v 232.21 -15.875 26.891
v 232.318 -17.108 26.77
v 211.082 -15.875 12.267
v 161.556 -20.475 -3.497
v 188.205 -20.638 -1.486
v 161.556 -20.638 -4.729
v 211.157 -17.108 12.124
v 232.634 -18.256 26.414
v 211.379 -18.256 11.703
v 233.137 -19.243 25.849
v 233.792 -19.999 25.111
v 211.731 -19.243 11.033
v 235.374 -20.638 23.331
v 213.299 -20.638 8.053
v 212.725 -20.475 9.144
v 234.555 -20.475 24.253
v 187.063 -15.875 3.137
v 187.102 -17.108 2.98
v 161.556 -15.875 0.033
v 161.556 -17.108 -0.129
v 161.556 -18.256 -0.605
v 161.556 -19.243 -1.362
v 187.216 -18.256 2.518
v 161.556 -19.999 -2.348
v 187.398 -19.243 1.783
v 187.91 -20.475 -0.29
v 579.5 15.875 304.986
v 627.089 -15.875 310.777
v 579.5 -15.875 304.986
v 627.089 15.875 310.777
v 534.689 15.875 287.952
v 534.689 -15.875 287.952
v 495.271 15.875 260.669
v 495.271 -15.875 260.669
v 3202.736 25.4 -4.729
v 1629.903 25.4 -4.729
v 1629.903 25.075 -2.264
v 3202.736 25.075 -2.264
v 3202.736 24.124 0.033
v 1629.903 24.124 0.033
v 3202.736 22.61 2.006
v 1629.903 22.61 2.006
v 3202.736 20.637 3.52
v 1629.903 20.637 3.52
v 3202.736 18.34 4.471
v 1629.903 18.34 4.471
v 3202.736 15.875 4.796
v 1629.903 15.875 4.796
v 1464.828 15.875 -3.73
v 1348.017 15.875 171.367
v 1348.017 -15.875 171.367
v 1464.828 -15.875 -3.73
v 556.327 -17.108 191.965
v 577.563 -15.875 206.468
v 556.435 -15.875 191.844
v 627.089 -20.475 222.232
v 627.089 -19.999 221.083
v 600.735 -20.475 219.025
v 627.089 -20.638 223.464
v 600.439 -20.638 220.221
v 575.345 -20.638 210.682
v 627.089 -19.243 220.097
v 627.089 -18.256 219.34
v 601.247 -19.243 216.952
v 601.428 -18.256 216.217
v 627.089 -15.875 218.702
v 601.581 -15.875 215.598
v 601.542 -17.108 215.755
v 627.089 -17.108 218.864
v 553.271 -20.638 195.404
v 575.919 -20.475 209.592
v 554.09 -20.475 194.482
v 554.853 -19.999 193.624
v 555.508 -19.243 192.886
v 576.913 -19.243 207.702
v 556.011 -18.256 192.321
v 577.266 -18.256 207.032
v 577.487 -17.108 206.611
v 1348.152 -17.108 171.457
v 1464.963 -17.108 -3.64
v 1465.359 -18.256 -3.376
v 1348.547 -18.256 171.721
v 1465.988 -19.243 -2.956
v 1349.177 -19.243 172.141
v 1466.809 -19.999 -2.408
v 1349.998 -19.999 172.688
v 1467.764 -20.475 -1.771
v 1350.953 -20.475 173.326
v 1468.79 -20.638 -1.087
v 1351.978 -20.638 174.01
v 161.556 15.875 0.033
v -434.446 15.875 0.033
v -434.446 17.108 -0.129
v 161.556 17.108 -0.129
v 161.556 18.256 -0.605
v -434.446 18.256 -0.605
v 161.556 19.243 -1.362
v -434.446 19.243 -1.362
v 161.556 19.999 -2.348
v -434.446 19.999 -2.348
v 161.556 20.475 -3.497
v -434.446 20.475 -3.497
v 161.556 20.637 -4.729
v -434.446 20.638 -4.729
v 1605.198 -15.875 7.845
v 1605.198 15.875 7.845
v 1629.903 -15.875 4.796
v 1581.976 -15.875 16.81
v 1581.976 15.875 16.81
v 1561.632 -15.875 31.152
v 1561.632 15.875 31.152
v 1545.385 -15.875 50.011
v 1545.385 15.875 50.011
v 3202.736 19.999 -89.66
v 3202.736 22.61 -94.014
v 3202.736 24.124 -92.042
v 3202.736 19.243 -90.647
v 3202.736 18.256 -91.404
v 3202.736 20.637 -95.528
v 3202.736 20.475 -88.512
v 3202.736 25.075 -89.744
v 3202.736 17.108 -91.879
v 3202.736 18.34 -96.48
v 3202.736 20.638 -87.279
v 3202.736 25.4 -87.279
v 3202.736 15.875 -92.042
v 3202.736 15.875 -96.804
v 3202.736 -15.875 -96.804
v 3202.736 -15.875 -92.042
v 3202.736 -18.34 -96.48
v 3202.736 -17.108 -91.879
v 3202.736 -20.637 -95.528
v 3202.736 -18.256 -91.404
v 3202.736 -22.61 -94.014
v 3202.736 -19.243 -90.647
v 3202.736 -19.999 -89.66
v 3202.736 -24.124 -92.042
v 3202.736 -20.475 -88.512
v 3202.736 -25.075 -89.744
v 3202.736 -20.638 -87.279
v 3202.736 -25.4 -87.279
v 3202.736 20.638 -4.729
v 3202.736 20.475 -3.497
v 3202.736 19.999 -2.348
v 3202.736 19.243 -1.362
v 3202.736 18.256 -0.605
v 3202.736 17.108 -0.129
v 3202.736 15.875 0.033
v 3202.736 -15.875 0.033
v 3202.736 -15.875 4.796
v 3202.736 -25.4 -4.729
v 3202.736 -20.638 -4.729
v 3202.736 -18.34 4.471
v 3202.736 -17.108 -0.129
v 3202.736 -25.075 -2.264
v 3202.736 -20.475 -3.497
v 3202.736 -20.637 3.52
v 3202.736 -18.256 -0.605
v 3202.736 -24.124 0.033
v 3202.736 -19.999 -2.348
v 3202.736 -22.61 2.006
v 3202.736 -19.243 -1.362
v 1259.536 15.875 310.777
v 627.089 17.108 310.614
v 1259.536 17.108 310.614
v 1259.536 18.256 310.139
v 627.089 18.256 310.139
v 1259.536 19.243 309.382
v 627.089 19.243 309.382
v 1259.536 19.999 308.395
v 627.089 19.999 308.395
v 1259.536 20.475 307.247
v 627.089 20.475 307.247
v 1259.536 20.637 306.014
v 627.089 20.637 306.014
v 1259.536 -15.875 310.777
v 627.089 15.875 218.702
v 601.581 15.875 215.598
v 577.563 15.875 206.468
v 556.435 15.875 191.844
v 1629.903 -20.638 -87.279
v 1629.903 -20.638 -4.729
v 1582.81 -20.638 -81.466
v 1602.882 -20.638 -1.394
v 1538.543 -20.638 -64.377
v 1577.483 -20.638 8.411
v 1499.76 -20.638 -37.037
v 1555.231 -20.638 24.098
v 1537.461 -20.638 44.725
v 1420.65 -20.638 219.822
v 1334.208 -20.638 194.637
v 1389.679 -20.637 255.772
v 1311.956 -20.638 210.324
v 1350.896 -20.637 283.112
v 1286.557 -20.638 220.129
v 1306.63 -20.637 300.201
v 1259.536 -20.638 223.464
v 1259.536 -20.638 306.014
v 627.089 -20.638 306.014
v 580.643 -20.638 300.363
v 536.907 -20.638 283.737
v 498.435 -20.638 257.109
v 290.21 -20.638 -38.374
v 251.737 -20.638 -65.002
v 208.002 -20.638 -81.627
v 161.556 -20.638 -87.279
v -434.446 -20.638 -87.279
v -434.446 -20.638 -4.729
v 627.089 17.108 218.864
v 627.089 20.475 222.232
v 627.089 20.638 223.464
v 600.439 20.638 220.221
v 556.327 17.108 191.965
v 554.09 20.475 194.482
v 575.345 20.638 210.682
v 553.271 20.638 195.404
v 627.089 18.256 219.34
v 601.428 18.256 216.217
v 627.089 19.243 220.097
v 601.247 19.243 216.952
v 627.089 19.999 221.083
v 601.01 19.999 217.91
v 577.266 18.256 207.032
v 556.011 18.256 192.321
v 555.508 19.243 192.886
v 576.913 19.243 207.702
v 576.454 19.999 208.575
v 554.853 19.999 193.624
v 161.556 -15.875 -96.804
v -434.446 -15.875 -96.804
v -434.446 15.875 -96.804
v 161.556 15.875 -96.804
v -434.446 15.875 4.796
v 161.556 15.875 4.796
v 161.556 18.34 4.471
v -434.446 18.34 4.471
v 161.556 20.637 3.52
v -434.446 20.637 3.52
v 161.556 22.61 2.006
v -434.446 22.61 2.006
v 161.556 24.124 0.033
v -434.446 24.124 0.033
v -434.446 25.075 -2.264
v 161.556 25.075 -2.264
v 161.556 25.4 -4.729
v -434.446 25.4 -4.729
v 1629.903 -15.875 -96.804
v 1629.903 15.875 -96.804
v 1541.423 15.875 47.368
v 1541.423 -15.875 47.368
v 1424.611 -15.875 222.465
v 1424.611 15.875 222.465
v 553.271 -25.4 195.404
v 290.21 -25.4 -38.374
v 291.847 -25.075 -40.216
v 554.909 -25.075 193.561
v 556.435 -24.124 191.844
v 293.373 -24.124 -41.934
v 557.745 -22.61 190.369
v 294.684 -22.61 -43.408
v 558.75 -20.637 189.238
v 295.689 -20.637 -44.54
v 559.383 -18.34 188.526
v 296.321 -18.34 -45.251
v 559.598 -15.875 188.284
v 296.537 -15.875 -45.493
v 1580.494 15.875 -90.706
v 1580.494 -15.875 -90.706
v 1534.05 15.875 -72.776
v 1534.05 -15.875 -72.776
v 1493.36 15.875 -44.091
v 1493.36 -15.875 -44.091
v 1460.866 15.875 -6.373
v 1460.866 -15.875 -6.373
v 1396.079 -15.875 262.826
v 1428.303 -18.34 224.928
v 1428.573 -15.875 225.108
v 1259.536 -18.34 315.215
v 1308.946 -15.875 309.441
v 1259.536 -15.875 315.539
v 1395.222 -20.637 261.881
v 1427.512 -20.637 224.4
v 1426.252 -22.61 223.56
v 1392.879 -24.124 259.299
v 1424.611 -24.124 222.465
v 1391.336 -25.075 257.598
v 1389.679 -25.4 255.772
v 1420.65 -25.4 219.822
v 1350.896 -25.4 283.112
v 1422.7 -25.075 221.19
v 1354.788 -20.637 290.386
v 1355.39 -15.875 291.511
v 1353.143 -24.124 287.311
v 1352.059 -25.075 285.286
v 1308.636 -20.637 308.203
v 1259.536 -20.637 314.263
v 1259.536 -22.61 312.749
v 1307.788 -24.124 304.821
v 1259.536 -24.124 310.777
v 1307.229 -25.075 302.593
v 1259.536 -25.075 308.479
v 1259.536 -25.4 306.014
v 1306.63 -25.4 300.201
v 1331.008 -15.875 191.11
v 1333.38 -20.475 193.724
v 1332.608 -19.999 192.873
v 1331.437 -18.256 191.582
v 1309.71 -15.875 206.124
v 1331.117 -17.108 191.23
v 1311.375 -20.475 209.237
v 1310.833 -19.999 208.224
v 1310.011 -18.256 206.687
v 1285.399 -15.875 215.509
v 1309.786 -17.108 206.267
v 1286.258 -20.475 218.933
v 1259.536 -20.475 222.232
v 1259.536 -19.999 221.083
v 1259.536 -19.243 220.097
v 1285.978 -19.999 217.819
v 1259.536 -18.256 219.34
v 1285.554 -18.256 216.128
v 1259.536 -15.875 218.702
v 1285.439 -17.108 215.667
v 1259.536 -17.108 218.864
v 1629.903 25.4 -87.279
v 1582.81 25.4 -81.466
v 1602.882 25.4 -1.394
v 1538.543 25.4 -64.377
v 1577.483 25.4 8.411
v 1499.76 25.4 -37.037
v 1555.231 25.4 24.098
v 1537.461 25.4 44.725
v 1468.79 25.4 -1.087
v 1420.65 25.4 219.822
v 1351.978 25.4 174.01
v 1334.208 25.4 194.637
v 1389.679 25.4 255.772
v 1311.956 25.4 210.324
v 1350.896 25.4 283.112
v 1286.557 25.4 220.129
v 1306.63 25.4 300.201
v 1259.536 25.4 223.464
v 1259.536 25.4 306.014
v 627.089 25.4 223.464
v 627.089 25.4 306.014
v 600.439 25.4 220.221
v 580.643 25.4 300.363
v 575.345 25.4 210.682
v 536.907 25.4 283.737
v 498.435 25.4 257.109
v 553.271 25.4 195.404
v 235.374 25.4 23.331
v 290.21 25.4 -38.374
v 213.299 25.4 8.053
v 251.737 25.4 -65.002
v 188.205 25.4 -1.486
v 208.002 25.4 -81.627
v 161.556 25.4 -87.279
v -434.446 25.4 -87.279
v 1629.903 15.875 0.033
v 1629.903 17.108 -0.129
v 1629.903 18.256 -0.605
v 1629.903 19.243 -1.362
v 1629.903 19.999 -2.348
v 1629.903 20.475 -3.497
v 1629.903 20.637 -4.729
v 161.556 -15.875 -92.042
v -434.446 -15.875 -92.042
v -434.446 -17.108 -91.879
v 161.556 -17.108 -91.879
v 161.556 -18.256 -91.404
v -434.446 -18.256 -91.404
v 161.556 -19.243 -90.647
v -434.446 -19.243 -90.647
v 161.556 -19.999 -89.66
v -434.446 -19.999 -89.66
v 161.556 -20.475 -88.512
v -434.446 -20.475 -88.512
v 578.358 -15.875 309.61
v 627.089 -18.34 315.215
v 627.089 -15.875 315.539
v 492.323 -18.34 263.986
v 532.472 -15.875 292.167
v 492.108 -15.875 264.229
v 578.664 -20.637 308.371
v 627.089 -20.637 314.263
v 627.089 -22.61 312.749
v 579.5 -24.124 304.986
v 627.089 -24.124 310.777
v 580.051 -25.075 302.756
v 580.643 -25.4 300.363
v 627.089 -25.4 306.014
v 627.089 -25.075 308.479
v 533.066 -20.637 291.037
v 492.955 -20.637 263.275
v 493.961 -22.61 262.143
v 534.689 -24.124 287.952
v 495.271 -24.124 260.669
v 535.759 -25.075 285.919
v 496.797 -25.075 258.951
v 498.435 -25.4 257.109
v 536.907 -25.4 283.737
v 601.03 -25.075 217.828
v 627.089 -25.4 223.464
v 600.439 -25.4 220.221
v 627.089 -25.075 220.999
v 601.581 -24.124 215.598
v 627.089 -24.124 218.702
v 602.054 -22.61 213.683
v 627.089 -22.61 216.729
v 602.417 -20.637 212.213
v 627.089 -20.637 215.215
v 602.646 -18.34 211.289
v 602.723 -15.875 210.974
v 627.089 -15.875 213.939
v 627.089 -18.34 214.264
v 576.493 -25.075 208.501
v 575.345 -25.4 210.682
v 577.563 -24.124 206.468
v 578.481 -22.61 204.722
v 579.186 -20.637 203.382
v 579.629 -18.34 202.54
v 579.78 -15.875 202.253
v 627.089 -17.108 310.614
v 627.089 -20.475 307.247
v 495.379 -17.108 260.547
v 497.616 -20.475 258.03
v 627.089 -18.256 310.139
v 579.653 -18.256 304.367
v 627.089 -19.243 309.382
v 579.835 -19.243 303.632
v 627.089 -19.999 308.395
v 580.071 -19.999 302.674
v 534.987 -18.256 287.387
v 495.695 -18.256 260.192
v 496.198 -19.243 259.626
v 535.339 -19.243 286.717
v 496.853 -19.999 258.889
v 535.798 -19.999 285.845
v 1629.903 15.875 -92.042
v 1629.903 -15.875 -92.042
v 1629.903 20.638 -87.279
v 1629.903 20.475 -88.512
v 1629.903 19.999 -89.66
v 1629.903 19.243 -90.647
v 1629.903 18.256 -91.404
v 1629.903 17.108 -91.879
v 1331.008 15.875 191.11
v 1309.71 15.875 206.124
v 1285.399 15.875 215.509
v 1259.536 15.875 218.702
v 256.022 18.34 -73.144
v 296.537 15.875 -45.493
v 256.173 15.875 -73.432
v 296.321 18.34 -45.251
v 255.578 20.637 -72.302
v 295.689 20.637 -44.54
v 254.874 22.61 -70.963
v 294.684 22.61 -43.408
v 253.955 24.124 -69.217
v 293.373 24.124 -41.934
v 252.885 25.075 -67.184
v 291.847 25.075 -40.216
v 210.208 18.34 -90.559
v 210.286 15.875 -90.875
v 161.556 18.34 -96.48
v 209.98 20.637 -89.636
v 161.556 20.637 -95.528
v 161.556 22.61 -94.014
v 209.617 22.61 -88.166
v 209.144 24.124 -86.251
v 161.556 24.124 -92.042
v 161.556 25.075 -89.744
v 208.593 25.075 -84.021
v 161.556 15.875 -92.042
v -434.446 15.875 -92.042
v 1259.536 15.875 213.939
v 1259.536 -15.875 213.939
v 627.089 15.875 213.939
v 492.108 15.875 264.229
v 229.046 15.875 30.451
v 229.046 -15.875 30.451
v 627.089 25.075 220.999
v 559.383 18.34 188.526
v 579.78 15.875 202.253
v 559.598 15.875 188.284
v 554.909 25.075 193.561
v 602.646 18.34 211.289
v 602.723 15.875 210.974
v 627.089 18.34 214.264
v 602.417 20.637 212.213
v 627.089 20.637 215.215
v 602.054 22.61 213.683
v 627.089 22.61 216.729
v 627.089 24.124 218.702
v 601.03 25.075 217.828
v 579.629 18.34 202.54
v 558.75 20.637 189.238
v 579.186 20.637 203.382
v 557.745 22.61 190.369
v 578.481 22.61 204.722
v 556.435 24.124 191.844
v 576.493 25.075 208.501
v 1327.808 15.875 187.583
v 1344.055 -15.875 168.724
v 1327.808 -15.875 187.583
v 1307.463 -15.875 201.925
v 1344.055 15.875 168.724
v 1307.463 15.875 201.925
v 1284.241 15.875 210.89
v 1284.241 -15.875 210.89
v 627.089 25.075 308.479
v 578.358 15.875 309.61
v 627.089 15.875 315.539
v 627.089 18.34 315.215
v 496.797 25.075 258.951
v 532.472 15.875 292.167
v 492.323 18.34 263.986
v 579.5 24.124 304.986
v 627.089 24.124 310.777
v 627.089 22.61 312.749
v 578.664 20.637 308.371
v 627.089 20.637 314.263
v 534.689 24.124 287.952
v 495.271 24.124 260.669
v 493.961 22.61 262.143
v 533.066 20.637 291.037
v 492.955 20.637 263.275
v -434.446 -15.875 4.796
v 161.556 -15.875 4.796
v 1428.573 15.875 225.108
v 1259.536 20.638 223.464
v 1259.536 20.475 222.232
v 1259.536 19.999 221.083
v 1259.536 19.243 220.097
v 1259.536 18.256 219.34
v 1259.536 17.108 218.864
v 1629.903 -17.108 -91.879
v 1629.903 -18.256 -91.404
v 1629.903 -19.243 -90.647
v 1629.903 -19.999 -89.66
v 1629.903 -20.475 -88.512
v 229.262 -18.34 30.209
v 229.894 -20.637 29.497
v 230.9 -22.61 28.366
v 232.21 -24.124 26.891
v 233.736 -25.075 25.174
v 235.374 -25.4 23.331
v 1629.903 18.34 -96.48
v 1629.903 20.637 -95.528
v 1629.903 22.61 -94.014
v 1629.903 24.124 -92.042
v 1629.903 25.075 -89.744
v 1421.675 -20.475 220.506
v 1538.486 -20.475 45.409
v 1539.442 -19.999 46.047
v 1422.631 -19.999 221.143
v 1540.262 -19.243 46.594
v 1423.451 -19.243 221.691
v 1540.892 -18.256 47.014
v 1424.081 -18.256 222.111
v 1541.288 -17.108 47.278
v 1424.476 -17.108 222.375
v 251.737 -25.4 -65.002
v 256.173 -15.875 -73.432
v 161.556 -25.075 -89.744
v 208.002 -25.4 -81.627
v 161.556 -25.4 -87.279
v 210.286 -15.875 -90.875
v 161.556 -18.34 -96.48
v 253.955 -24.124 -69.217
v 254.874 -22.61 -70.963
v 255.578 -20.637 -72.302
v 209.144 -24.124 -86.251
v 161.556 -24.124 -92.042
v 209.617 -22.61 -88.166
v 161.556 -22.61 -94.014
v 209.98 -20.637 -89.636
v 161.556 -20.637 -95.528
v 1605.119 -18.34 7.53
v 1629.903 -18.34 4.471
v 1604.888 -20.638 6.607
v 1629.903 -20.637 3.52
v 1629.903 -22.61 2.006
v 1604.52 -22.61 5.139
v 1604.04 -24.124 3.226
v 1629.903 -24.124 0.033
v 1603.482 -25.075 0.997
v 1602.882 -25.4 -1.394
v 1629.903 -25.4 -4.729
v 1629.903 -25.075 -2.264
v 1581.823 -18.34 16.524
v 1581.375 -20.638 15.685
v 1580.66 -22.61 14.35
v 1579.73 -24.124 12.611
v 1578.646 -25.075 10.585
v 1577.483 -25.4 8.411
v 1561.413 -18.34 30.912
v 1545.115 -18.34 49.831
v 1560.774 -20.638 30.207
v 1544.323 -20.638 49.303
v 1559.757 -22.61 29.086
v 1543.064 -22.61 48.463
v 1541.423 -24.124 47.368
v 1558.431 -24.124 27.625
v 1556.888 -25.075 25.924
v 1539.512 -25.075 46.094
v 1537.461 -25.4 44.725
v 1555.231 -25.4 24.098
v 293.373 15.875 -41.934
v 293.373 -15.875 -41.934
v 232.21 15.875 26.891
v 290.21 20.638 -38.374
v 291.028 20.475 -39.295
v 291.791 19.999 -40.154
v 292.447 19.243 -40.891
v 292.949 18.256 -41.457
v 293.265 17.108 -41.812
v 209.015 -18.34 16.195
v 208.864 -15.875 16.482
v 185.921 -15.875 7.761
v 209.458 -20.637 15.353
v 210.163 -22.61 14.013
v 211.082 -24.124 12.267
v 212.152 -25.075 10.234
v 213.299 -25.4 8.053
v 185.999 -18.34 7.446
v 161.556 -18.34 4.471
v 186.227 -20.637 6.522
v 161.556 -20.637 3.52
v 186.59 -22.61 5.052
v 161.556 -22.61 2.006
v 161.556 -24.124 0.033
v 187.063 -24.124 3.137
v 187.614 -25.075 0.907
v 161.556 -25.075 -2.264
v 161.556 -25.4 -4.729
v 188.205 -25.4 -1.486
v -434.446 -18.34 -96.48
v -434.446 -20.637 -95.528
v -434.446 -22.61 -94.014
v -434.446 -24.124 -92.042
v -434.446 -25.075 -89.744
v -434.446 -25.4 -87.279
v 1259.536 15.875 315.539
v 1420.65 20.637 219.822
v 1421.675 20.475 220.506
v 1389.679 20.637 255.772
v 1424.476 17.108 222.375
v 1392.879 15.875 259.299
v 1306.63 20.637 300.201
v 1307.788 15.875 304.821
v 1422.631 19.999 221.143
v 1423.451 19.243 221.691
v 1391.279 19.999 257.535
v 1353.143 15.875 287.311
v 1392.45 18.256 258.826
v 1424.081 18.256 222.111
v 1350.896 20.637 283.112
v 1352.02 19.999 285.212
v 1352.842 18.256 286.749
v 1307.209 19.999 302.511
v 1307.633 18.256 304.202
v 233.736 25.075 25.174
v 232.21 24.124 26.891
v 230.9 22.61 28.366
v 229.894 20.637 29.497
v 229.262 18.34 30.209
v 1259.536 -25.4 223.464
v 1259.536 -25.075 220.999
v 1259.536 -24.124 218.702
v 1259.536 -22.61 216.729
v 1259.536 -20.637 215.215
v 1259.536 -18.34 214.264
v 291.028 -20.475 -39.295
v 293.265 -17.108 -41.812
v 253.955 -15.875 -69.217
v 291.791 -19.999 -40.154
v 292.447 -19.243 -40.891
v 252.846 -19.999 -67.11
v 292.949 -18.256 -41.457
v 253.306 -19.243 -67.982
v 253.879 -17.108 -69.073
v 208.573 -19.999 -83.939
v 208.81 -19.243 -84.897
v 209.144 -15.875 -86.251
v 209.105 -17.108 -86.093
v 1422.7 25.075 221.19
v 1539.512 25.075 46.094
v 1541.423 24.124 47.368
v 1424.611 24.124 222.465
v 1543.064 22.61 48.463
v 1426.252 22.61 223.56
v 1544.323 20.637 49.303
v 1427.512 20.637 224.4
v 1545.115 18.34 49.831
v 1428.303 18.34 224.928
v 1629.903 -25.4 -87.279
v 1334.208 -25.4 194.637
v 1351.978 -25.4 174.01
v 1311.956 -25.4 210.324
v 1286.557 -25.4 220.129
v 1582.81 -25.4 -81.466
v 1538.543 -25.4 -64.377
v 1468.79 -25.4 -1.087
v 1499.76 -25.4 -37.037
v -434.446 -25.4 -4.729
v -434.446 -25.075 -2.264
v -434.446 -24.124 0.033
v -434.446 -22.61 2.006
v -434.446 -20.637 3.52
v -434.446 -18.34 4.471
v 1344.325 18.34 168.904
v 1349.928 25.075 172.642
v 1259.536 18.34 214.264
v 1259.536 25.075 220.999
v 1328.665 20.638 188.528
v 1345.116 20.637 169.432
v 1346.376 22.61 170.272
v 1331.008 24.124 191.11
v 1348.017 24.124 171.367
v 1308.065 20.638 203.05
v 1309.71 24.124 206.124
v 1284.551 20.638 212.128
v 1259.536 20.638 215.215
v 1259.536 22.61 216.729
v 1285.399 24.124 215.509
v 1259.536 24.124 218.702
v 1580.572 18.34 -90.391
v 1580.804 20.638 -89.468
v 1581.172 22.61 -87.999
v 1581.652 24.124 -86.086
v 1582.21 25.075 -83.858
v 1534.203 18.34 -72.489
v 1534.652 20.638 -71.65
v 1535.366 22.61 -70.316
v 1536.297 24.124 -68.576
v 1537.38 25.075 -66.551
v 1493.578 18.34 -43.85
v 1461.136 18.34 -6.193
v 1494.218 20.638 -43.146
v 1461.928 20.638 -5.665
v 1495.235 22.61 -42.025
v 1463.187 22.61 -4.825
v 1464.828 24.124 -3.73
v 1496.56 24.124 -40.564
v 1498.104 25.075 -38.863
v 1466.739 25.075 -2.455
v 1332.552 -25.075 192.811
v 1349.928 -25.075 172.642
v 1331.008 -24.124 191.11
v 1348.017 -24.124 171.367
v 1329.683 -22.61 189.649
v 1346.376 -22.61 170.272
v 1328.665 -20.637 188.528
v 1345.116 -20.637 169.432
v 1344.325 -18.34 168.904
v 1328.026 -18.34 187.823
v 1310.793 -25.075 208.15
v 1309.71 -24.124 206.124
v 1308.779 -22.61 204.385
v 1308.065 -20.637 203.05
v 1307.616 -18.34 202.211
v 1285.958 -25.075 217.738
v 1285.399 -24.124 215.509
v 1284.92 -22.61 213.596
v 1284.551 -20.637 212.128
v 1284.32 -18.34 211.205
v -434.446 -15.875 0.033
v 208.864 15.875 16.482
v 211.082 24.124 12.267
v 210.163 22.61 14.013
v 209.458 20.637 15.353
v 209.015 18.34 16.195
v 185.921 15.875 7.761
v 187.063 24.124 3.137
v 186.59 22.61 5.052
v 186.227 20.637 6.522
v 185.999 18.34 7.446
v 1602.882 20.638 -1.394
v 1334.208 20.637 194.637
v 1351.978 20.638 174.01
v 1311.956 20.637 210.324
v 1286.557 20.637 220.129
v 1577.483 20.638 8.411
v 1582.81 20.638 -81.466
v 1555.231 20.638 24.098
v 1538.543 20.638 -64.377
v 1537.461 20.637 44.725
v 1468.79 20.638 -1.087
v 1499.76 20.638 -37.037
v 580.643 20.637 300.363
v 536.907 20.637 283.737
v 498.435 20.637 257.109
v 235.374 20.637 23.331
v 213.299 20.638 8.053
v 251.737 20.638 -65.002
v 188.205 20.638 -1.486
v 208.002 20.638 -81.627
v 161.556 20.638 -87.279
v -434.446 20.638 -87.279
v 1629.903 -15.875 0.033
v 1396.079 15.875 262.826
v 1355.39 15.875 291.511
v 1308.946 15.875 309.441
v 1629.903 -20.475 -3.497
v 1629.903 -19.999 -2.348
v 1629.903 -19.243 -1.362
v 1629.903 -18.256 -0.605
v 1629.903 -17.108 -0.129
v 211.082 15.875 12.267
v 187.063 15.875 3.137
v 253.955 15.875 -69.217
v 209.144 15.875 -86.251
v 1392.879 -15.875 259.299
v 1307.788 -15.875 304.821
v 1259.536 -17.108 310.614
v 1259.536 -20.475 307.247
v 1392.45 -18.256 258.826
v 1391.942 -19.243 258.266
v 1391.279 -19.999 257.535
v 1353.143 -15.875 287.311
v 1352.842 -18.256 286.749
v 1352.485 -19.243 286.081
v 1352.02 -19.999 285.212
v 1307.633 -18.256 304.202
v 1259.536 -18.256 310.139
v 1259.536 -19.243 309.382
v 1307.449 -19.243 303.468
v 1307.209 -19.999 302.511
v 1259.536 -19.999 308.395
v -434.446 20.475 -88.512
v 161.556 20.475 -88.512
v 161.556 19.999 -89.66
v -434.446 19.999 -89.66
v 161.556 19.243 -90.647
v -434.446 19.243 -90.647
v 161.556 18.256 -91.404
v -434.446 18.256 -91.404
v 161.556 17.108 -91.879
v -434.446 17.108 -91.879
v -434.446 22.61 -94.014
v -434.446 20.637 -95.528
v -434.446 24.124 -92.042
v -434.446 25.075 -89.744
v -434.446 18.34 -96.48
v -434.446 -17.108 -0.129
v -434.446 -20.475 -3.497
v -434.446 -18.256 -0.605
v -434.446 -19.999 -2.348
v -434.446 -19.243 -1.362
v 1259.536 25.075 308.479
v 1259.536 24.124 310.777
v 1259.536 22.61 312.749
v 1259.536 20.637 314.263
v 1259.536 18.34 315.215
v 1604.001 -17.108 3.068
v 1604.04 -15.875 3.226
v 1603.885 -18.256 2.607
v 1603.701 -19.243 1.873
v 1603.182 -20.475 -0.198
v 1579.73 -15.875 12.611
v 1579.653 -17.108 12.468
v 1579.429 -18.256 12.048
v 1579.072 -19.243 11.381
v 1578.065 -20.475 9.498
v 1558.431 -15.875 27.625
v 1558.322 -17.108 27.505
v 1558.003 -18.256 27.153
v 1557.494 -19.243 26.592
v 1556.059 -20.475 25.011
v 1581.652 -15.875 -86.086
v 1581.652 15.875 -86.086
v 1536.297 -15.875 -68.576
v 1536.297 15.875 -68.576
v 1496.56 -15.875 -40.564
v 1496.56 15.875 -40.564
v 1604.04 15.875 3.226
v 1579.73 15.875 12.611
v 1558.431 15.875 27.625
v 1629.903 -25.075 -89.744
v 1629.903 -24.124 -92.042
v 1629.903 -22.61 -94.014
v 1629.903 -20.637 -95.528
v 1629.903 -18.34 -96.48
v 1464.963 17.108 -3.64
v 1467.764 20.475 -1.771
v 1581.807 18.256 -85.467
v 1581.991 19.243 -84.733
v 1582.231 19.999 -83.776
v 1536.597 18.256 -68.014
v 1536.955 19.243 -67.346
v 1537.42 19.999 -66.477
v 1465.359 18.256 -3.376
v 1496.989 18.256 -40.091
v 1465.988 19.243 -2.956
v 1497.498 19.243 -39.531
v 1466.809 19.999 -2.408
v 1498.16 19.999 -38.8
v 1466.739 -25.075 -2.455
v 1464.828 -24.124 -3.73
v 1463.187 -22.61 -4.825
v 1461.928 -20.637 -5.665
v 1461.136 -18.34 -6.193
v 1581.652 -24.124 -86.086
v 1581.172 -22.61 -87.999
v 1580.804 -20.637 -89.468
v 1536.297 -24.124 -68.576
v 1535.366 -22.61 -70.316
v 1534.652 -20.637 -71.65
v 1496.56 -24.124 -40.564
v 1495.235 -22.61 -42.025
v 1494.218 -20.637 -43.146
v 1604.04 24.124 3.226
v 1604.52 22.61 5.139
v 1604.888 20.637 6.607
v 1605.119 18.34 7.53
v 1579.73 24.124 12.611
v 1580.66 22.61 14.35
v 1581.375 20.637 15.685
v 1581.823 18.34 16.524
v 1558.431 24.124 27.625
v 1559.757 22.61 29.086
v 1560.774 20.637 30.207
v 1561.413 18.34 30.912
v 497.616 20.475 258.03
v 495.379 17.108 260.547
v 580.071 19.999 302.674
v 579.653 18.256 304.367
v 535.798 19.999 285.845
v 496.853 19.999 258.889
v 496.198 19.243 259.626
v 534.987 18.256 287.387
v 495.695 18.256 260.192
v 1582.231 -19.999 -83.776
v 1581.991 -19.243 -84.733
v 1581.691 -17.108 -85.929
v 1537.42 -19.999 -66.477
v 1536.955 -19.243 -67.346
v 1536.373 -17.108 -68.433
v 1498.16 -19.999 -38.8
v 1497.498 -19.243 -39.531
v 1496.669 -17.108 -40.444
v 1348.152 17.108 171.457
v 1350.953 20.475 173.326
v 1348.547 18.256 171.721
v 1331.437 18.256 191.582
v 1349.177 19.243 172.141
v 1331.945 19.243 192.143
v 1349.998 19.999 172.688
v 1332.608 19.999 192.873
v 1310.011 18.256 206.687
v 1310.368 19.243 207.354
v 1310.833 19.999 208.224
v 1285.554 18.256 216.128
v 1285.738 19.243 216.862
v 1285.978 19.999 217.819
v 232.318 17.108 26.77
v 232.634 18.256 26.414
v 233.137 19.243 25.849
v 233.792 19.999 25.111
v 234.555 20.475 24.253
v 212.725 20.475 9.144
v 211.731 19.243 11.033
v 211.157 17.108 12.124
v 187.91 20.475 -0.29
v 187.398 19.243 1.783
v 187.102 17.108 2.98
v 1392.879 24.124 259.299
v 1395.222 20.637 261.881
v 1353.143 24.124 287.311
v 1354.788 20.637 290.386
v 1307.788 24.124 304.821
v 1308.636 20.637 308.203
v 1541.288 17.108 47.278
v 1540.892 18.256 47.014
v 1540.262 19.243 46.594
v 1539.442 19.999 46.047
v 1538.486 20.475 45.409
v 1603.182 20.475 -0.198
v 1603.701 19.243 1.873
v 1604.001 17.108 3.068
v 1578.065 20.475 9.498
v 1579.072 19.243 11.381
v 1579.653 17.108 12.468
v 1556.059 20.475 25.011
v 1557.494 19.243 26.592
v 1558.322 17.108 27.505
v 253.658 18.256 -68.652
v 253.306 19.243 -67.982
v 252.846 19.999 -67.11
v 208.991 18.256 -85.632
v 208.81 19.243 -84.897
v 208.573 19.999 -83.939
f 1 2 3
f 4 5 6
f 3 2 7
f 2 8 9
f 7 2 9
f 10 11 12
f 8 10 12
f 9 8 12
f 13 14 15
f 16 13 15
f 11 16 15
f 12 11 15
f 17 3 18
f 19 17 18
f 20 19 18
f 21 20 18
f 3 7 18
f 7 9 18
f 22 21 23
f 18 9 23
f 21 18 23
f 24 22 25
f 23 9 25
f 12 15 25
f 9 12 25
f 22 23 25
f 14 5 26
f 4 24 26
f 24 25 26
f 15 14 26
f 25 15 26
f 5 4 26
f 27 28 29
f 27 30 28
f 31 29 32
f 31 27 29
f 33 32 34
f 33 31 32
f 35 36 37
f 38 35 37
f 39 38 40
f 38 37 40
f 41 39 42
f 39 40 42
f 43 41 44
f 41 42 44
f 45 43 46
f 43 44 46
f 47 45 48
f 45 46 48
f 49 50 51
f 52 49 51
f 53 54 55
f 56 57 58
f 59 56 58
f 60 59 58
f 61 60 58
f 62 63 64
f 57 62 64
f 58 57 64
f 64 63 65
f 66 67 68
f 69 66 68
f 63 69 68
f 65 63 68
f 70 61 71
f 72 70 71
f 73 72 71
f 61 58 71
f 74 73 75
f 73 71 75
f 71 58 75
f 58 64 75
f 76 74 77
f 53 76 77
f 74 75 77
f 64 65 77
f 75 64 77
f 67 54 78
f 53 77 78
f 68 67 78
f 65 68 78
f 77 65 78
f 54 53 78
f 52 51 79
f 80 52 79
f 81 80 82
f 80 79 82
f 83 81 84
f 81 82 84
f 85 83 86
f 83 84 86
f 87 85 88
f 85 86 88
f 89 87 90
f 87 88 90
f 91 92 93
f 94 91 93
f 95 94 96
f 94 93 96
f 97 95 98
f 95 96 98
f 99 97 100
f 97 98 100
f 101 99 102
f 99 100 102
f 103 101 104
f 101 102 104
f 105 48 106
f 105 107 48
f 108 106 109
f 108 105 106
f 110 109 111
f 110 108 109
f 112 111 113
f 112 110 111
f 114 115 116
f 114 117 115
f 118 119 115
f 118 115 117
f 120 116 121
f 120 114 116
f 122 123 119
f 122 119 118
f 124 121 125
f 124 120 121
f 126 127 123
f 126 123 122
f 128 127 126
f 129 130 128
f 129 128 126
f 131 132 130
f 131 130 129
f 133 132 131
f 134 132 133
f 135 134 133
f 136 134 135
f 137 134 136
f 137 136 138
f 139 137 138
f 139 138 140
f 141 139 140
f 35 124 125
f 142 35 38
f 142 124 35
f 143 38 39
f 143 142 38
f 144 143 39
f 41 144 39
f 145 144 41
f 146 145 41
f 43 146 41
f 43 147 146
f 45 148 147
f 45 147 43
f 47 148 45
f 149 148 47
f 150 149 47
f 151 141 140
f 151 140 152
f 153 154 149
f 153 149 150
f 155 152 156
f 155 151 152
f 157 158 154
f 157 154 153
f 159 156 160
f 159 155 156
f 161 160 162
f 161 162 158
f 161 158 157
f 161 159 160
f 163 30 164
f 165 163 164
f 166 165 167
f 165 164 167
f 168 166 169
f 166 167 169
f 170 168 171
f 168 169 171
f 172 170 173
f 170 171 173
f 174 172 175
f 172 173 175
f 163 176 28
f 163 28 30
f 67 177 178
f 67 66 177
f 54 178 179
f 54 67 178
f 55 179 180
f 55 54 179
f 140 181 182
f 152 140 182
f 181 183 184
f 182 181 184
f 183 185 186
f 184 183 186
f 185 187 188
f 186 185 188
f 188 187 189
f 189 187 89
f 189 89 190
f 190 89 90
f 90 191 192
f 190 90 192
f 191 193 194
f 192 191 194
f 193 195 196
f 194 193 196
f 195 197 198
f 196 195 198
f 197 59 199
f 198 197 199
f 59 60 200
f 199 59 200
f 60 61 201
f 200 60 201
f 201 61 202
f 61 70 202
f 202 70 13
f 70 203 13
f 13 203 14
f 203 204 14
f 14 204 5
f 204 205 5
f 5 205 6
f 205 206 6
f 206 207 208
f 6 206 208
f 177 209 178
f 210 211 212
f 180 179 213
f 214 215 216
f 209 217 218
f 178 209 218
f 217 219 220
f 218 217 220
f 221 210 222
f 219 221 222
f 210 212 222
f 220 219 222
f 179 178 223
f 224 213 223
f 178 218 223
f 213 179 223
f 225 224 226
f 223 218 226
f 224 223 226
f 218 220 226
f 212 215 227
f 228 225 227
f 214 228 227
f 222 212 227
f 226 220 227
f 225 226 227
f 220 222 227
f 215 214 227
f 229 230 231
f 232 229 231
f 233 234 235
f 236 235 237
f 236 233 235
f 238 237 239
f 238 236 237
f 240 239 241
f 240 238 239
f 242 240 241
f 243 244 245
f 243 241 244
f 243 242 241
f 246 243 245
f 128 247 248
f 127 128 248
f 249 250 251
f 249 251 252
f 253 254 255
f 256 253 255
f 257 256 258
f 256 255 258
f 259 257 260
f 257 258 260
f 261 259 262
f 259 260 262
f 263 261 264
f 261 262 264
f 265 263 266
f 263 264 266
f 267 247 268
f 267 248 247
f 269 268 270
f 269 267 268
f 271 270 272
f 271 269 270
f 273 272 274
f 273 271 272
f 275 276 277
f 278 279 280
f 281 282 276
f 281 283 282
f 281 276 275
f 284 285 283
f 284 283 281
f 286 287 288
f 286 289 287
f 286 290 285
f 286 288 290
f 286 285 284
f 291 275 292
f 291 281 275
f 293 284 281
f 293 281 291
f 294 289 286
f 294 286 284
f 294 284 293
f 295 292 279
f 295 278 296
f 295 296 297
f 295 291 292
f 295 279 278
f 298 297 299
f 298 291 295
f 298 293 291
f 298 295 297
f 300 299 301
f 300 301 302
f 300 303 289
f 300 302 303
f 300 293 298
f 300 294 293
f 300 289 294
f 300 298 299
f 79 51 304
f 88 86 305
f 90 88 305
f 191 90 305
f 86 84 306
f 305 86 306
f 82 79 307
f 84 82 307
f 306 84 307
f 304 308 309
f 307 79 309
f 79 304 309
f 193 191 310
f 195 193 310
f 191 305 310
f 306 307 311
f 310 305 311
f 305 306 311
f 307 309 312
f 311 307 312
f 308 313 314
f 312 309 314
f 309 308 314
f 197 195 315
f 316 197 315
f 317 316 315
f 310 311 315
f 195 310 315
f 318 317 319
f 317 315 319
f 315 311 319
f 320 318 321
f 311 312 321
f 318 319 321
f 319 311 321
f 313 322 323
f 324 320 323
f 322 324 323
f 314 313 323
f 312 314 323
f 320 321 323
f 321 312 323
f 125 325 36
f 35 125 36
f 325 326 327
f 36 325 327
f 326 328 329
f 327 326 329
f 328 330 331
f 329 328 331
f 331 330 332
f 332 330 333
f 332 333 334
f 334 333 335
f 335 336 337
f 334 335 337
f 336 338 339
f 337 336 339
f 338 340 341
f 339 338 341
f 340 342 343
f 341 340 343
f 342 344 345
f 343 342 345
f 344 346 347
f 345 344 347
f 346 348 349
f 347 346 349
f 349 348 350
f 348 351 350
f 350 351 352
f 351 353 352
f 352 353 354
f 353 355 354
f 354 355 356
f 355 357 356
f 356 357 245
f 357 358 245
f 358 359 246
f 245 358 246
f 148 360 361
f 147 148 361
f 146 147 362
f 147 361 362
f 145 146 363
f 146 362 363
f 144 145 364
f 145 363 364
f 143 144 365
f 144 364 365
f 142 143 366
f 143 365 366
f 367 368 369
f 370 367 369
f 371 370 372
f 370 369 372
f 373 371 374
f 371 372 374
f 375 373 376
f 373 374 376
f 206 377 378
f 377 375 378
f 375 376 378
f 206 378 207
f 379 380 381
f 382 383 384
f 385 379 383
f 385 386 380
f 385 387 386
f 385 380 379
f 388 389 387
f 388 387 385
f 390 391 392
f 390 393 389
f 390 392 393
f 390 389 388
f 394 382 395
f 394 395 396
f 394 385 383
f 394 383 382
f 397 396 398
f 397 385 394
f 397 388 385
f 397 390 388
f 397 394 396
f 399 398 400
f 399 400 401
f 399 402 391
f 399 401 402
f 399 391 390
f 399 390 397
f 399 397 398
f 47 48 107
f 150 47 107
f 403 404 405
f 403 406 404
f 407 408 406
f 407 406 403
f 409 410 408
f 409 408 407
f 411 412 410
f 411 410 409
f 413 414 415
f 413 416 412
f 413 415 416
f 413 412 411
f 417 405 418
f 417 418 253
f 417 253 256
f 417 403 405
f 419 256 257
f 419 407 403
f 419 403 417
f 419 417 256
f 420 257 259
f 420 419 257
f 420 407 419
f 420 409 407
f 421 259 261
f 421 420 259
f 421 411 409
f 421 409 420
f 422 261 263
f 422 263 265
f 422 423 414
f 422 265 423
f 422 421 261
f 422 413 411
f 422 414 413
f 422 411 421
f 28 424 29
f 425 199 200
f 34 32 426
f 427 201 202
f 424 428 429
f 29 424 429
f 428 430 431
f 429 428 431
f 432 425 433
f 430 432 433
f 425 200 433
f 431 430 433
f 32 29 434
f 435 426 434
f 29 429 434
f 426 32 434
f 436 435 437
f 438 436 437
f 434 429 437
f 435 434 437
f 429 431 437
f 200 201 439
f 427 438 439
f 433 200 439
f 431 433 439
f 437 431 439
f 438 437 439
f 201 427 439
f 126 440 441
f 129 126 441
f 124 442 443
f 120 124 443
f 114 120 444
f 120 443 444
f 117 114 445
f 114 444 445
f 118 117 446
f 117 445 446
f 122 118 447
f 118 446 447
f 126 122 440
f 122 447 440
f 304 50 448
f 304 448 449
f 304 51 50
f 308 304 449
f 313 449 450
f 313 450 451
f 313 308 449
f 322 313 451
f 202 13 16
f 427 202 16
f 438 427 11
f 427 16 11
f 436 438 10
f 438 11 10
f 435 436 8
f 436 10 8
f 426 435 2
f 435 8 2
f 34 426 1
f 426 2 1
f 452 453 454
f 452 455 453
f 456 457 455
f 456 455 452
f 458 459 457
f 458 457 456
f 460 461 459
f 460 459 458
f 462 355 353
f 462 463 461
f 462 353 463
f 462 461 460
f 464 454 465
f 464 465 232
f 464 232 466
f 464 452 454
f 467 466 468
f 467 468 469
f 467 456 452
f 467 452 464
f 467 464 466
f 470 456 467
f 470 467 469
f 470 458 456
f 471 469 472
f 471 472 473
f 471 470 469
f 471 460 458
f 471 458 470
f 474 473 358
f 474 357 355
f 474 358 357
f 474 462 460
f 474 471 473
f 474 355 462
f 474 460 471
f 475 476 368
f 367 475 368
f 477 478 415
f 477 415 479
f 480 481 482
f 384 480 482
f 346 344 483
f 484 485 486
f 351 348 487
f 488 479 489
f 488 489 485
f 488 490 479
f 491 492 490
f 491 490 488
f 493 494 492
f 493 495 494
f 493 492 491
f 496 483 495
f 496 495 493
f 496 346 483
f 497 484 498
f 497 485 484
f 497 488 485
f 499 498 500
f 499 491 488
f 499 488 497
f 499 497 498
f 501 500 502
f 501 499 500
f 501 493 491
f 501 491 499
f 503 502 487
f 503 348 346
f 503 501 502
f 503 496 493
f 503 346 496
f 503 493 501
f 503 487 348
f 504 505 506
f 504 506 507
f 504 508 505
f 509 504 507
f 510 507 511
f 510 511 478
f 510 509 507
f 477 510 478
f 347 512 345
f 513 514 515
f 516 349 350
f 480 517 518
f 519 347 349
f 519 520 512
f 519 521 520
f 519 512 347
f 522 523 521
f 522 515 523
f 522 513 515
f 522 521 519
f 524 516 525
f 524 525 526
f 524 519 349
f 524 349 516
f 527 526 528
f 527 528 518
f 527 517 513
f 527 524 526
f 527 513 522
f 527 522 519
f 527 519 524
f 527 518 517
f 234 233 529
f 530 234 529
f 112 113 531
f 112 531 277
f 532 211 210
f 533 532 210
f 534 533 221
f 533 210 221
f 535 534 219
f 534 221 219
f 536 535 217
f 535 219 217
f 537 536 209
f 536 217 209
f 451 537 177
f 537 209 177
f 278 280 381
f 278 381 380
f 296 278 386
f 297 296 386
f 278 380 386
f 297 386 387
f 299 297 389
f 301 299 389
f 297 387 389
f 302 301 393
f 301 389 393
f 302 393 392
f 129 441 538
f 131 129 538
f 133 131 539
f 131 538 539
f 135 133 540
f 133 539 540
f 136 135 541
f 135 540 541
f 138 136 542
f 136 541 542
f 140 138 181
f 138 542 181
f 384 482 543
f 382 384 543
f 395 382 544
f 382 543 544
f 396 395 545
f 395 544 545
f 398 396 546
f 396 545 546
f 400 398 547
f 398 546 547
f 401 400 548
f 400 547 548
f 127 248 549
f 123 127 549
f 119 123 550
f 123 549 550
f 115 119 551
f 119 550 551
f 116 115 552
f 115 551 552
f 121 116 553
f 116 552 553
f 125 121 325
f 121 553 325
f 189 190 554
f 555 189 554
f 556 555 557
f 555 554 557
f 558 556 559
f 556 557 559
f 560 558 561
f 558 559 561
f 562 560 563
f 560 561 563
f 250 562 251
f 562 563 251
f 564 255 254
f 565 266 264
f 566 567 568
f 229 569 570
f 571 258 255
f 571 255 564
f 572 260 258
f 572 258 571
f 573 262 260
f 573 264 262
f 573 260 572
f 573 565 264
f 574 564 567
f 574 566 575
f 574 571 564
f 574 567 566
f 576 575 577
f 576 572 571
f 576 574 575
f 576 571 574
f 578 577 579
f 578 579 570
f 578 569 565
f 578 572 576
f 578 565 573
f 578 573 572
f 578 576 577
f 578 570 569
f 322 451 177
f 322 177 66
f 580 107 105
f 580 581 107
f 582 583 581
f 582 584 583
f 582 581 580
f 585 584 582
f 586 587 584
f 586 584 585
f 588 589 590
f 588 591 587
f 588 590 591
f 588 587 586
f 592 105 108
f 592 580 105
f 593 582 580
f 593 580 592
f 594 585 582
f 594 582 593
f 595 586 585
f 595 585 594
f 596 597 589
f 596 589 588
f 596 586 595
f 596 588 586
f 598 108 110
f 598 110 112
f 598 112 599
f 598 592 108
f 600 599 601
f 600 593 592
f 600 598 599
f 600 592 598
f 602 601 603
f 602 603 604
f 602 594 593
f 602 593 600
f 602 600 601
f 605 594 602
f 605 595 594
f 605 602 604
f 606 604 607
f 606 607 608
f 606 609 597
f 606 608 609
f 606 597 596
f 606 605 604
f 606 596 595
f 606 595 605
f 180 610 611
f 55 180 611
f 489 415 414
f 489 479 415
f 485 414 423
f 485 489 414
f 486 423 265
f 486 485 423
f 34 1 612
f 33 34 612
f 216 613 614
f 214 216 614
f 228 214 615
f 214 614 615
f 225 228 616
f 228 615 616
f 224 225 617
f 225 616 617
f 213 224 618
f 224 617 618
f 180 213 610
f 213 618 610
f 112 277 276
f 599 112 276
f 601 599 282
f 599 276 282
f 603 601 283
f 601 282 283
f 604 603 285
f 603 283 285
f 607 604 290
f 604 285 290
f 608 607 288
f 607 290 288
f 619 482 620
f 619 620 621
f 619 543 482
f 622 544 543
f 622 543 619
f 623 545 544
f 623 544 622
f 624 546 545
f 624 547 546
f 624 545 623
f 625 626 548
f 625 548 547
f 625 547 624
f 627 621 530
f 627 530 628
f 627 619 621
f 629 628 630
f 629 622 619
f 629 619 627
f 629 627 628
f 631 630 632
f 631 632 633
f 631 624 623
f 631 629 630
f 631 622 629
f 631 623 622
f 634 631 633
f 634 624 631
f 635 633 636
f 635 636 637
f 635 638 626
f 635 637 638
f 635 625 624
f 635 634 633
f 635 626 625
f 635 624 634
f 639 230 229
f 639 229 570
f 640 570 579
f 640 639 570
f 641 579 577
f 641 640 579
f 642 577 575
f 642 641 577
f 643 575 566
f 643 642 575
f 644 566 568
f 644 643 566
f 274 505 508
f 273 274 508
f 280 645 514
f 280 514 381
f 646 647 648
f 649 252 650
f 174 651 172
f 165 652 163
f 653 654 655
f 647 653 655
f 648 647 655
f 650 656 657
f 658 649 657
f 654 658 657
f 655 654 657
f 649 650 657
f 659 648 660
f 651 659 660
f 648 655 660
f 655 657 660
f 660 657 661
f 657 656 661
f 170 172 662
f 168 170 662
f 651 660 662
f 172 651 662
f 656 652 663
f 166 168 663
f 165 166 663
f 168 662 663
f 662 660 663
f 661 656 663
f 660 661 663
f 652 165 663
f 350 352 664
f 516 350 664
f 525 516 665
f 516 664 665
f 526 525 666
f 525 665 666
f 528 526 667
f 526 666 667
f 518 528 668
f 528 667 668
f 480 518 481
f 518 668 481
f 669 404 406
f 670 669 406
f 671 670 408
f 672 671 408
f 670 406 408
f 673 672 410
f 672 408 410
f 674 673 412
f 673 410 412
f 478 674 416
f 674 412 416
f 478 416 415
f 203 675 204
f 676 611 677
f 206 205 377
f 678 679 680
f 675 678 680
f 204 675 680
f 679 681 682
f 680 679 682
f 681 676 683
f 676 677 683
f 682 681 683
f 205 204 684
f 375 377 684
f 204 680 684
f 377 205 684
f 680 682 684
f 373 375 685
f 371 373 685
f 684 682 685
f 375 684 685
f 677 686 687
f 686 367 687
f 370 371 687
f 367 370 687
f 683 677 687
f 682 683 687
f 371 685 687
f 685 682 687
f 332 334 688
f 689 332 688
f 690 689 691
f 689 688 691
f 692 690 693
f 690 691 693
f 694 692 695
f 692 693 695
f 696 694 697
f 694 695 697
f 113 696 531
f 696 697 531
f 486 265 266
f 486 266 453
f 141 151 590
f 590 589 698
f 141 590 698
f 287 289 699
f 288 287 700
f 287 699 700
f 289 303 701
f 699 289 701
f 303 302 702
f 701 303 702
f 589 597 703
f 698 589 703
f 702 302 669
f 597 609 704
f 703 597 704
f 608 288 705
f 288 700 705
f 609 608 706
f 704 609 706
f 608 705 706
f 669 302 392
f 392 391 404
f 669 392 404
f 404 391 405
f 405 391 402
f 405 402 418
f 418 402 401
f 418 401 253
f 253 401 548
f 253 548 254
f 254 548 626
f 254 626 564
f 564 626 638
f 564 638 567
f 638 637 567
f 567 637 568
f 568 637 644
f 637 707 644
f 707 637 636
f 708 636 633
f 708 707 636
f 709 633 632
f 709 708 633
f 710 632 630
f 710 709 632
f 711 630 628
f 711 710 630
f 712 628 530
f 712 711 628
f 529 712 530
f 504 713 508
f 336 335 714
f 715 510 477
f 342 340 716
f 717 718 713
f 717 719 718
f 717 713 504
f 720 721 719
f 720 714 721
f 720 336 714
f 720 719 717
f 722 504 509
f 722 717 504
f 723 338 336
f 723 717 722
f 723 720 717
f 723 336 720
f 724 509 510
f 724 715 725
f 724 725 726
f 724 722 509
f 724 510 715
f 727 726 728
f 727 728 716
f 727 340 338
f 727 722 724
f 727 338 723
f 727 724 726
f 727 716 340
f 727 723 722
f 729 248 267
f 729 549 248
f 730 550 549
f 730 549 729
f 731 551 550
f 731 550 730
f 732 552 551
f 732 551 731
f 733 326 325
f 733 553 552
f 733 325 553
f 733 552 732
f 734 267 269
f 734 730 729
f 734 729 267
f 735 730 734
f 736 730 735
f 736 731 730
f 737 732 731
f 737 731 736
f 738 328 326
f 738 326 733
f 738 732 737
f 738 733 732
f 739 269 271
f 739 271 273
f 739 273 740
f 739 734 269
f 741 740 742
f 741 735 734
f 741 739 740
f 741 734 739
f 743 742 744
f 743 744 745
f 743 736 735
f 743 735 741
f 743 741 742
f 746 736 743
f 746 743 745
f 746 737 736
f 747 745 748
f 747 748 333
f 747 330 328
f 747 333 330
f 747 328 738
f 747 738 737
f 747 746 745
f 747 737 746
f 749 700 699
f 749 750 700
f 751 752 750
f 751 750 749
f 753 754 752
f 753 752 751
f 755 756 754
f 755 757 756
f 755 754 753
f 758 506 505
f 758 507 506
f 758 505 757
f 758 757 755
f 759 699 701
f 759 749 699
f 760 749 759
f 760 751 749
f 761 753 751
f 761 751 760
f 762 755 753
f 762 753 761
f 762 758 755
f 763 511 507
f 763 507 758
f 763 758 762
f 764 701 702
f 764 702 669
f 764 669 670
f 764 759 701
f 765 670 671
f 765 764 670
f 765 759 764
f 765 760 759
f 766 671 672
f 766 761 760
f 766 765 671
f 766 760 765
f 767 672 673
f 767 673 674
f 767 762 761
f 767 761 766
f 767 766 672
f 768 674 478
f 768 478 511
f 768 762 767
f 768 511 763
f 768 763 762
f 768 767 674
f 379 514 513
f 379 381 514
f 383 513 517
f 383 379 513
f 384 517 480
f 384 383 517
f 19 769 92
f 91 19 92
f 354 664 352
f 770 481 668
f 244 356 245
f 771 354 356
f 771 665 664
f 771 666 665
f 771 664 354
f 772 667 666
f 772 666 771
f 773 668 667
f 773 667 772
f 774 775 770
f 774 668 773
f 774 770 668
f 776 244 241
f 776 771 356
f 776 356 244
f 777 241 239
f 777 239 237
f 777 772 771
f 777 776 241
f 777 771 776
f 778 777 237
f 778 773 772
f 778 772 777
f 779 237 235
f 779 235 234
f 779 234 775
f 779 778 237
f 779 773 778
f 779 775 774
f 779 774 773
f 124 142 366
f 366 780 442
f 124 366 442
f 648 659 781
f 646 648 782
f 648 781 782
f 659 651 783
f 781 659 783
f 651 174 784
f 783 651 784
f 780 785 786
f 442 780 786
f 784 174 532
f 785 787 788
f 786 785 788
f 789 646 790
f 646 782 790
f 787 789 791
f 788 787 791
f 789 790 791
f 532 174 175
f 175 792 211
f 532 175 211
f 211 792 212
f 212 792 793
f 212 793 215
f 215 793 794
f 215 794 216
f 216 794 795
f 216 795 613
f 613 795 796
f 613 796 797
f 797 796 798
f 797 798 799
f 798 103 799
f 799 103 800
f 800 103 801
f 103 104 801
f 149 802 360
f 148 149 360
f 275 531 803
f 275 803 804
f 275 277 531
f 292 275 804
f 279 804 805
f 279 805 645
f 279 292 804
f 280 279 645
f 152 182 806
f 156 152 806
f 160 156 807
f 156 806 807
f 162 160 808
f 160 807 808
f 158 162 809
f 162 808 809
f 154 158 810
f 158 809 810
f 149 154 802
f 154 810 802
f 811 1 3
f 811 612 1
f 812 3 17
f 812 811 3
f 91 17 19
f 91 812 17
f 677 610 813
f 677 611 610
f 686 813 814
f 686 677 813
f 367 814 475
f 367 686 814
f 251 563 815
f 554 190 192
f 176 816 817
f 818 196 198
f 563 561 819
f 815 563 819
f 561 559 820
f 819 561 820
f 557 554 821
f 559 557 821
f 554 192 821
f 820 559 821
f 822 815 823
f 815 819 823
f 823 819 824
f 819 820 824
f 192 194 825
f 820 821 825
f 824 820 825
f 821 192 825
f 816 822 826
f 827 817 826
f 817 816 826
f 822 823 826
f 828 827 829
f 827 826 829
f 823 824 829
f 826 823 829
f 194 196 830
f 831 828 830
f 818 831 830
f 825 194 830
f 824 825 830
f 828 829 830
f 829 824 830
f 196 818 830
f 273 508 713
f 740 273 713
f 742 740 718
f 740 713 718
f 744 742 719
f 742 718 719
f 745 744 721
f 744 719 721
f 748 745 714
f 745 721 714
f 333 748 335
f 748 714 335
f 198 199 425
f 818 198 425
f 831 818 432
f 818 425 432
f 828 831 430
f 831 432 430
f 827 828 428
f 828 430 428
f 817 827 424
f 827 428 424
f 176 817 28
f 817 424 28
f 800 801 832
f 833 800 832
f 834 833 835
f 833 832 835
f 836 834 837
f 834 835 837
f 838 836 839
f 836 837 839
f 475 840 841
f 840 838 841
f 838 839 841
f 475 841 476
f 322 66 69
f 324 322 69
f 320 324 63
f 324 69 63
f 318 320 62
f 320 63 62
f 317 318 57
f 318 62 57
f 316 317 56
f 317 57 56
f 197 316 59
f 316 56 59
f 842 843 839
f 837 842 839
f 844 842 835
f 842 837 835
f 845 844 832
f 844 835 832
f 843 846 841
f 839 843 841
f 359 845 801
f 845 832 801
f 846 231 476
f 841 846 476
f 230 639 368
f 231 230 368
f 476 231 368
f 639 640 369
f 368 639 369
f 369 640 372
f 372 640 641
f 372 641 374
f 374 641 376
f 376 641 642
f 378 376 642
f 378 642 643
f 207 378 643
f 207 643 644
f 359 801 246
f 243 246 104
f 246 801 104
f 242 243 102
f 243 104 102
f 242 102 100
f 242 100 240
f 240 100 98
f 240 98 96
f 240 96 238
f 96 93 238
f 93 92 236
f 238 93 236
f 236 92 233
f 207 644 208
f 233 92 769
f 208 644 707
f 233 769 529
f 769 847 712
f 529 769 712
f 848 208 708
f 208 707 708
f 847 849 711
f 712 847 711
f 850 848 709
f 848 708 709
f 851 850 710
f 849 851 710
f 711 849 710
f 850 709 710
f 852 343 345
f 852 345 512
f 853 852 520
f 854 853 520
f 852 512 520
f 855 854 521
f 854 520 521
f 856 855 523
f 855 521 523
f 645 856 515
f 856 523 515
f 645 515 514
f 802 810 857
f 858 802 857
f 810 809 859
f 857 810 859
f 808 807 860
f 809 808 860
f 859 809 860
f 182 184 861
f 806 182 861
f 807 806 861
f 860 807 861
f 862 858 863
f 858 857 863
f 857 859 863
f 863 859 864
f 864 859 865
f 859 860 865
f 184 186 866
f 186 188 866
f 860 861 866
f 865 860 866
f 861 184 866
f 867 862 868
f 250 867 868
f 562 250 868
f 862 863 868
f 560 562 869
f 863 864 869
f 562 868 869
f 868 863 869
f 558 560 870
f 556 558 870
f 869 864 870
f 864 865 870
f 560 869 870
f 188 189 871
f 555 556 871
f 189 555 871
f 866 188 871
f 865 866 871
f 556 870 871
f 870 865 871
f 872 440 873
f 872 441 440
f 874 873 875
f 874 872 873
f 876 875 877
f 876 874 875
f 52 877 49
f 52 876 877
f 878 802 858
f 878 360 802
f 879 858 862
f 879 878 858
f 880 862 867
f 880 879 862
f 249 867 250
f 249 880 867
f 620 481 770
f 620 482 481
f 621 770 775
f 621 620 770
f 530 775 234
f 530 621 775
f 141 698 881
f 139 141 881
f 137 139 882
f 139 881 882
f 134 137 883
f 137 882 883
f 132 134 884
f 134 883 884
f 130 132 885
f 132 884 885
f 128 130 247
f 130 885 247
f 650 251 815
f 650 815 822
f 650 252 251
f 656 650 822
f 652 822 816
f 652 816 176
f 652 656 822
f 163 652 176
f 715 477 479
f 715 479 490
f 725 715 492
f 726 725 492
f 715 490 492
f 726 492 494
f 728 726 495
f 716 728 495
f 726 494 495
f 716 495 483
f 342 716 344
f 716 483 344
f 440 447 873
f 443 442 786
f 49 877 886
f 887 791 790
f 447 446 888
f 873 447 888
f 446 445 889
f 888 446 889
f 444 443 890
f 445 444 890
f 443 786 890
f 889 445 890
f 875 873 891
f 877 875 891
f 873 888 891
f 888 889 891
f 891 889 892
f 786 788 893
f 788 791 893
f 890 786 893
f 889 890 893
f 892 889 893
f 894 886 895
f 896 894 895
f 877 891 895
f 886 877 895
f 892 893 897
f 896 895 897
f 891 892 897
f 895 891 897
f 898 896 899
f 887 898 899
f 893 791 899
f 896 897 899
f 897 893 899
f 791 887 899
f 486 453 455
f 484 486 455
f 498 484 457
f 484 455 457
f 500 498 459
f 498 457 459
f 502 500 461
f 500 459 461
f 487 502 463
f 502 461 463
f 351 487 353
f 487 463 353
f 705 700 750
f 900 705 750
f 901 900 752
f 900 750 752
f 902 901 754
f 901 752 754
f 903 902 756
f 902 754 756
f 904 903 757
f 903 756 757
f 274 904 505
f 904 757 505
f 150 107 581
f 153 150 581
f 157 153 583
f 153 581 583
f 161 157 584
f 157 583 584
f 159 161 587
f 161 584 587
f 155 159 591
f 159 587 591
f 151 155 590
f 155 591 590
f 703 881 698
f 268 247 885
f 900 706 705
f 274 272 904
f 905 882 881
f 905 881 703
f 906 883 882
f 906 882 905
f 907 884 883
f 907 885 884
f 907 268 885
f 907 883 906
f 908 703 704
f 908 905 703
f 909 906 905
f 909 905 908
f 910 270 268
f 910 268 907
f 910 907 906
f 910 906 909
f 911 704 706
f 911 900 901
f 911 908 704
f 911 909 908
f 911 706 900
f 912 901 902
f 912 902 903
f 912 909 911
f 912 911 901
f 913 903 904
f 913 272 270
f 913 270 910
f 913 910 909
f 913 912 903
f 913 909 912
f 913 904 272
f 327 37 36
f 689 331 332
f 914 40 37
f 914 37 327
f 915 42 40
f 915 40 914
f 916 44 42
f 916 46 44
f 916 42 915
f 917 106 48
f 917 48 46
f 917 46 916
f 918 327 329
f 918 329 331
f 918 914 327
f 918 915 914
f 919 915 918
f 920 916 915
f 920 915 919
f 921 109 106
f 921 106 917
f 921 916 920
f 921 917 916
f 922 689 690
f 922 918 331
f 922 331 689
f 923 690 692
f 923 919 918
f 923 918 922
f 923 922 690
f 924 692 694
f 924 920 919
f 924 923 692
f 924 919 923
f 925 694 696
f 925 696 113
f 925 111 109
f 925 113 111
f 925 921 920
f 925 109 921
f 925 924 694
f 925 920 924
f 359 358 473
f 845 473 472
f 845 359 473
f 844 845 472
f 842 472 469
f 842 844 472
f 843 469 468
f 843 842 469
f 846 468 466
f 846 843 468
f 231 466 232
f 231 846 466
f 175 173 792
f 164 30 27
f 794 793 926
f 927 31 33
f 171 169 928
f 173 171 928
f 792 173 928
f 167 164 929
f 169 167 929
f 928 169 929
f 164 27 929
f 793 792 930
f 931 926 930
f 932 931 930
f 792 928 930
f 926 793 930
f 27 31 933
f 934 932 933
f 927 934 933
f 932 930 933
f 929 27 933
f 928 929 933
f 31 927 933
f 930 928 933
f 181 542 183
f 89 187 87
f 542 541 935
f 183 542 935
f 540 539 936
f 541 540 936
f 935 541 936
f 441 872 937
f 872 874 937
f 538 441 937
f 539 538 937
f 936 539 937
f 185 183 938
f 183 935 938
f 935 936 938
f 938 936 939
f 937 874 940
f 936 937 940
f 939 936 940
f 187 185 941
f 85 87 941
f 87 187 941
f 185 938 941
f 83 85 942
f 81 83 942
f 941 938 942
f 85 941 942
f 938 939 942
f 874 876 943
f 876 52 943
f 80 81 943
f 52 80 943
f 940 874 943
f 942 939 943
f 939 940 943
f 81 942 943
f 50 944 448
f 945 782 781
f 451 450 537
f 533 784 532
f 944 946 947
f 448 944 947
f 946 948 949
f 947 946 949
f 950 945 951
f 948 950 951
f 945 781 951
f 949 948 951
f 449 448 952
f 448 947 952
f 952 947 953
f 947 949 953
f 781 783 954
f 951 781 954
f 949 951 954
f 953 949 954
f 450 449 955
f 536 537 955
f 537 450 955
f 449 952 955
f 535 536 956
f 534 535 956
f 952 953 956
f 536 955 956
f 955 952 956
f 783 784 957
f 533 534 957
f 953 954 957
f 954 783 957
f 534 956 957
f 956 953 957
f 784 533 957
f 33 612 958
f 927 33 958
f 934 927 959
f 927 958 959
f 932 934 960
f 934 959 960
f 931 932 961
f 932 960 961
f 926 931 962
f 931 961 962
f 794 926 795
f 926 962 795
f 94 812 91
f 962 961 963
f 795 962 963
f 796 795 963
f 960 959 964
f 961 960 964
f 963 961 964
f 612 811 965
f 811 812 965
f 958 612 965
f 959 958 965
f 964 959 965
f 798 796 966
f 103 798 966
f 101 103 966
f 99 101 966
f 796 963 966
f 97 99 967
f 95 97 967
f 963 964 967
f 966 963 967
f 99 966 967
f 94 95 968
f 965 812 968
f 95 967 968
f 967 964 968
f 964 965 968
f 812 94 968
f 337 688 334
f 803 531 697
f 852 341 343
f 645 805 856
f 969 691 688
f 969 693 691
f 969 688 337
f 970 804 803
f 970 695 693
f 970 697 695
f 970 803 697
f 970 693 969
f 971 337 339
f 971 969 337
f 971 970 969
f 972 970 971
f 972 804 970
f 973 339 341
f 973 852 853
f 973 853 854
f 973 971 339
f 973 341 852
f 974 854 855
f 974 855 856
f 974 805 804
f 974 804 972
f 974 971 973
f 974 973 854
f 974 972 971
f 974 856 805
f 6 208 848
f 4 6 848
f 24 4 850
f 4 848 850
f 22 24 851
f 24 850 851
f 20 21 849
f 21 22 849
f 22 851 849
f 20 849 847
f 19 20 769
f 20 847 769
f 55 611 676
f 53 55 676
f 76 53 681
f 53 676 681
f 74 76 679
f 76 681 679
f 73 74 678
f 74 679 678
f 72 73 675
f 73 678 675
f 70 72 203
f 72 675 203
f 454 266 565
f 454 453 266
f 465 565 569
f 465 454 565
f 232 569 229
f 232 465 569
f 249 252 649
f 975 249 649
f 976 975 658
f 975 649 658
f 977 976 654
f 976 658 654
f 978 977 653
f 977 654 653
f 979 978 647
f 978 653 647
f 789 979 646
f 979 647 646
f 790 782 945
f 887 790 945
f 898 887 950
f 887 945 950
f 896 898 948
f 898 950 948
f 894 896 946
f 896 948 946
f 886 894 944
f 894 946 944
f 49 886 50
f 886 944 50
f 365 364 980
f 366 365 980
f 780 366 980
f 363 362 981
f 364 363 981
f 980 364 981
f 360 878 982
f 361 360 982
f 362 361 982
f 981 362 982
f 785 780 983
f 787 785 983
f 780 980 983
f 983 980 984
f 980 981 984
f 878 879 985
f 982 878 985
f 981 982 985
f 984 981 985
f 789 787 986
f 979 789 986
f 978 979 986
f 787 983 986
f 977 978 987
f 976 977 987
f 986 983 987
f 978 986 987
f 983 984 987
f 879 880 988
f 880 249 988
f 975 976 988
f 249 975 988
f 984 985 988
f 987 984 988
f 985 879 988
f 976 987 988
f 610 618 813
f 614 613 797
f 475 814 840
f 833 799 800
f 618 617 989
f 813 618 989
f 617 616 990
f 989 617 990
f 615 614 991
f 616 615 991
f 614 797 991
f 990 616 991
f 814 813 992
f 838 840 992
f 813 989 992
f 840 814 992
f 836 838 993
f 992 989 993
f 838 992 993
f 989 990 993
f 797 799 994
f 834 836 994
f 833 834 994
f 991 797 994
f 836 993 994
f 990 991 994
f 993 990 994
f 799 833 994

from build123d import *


with BuildPart() as f3:
    # F3: sweep along a path in F0
    with BuildLine(Plane.XZ) as f3_path:
        Line((3202.736139, -46.004161), (1629.903024, -46.004161))
        ThreePointArc((1629.903024, -46.004161), (1558.013215, -27.982788), (1503.125414, 21.81926))
        Line((1503.125414, 21.81926), (1386.314049, 196.915794))
        ThreePointArc((1386.314049, 196.915794), (1331.426249, 246.717842), (1259.536439, 264.739215))
        Line((1259.536439, 264.739215), (627.088678, 264.739215))
        ThreePointArc((627.088678, 264.739215), (572.936984, 254.793959), (525.852908, 226.256198))
        Line((525.852908, 226.256198), (262.791644, -7.521144))
        ThreePointArc((262.791644, -7.521144), (215.707568, -36.058905), (161.555875, -46.004161))
        Line((161.555875, -46.004161), (-434.44556, -46.004161))
    # F2 (on face) → F3 (sweep)
    with BuildSketch(Plane.YZ.offset(-434.44556)):
        with BuildLine():
            ThreePointArc((25.4, -4.729161), (22.610192, 2.006031), (15.875, 4.795839))
            Line((15.875, 4.795839), (-15.875, 4.795839))
            ThreePointArc((-15.875, 4.795839), (-22.610192, 2.006031), (-25.4, -4.729161))
            Line((-25.4, -4.729161), (-25.4, -87.279161))
            ThreePointArc((-25.4, -87.279161), (-22.610192, -94.014353), (-15.875, -96.804161))
            Line((-15.875, -96.804161), (15.875, -96.804161))
            ThreePointArc((15.875, -96.804161), (22.610192, -94.014353), (25.4, -87.279161))
            Line((25.4, -87.279161), (25.4, -4.729161))
        make_face()
        with BuildLine():
            ThreePointArc((15.875, 0.033339), (19.242596, -1.361565), (20.6375, -4.729161))
            Line((20.6375, -4.729161), (20.6375, -87.279161))
            ThreePointArc((20.6375, -87.279161), (19.242596, -90.646757), (15.875, -92.041661))
            Line((15.875, -92.041661), (-15.875, -92.041661))
            ThreePointArc((-15.875, -92.041661), (-19.242596, -90.646757), (-20.6375, -87.279161))
            Line((-20.6375, -87.279161), (-20.6375, -4.729161))
            ThreePointArc((-20.6375, -4.729161), (-19.242596, -1.361565), (-15.875, 0.033339))
            Line((-15.875, 0.033339), (15.875, 0.033339))
        make_face(mode=Mode.SUBTRACT)
    sweep(path=f3_path.line)


solid = f3.part
